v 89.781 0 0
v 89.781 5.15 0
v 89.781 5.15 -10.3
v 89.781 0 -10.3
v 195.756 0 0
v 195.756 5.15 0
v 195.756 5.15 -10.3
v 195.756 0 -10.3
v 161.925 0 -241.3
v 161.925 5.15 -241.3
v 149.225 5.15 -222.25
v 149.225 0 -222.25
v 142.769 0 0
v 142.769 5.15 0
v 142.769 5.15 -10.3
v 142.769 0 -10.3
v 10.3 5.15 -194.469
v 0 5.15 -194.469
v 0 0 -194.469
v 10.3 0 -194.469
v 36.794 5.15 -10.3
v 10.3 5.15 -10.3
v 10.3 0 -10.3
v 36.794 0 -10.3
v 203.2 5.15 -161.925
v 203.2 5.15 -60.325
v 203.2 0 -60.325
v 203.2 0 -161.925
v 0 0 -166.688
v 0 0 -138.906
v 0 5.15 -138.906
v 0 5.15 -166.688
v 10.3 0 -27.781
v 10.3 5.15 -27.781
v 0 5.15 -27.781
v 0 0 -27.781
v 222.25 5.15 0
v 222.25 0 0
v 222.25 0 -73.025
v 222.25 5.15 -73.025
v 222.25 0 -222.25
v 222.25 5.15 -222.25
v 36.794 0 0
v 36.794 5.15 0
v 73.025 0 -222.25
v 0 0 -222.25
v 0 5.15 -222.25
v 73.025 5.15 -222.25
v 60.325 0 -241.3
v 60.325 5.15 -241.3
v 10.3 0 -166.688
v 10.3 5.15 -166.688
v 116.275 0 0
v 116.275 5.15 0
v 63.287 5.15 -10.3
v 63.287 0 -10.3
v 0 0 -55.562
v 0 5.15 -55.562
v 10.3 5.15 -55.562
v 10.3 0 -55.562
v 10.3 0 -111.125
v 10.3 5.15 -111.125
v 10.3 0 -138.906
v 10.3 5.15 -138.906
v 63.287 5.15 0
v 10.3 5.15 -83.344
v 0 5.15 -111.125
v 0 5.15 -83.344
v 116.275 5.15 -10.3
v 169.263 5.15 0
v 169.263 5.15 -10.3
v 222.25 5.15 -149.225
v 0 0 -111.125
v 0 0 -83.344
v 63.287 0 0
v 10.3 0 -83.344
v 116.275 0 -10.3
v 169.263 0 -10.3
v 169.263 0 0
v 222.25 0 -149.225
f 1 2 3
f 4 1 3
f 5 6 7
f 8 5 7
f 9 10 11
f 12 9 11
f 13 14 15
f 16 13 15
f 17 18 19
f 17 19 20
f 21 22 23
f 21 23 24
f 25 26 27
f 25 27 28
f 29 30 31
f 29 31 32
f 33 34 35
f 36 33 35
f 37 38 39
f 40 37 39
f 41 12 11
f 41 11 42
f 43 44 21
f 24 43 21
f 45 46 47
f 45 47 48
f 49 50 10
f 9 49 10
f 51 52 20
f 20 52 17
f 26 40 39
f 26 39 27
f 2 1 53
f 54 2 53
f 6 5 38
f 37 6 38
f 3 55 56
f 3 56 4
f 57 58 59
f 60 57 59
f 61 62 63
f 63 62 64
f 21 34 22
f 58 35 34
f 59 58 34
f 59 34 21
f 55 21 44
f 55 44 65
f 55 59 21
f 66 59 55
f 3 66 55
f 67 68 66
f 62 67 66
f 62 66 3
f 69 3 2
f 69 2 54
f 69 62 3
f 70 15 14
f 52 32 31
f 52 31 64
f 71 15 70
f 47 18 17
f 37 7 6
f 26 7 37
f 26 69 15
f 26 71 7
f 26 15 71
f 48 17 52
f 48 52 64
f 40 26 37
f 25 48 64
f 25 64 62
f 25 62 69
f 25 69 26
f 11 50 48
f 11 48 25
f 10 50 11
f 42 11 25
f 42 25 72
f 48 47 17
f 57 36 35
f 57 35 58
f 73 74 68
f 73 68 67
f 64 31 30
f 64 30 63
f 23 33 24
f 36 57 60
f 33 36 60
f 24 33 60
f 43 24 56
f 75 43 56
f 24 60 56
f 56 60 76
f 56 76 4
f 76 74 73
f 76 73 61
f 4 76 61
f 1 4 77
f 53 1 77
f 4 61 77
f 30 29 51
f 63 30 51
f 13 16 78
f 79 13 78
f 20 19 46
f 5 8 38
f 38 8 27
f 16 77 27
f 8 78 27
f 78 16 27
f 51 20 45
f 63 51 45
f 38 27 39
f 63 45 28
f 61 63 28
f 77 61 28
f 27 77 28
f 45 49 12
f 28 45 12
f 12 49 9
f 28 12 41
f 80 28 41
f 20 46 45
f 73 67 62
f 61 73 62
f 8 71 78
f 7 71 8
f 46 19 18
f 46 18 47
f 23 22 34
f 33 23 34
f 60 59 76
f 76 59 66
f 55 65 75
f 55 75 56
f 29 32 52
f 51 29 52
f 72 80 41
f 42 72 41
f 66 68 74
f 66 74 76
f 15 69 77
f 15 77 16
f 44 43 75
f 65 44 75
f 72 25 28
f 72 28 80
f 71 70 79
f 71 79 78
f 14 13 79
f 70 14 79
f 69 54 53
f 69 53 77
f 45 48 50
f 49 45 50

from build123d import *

# Parameters (mm, degrees)
SKETCH1_W           = 222.25
SKETCH1_H           = 222.25
BOSS_EXTRUDE1_DEPTH = 5.15
SKETCH2_W           = 26.49375
SKETCH2_H           = 10.3
SKETCH2_W_2         = 10.3
SKETCH2_H_2         = 27.78125
CUT_EXTRUDE1_DEPTH  = 315.351153171
BOSS_EXTRUDE2_DEPTH = 5.15
CUT_EXTRUDE2_DEPTH  = 329.096441614


with BuildPart() as part:
    # Sketch1 → Boss-Extrude1 (new body)
    with BuildSketch(Plane(origin=(0, 0, 0), x_dir=(1, 0, 0), z_dir=(0, 1, 0))):
        with Locations((111.125, 111.125)):
            Rectangle(SKETCH1_W, SKETCH1_H)
    extrude(amount=BOSS_EXTRUDE1_DEPTH)

    # Sketch2 → Cut-Extrude1 (cut, through all)
    with BuildSketch(Plane(origin=(0, 5.15, 0), x_dir=(1, 0, 0), z_dir=(0, 1, 0))):
        with Locations((182.509375, 5.15)):
            Rectangle(SKETCH2_W, SKETCH2_H)
        with Locations((129.521875, 5.15)):
            Rectangle(SKETCH2_W, SKETCH2_H)
        with Locations((76.534375, 5.15)):
            Rectangle(SKETCH2_W, SKETCH2_H)
        with Locations((23.546875, 5.15)):
            Rectangle(SKETCH2_W, SKETCH2_H)
        Polygon((0, 0), (10.3, 0), (10.3, 10.3), (10.3, 27.78125), (0, 27.78125), align=None)
        with Locations((5.15, 69.453125)):
            Rectangle(SKETCH2_W_2, SKETCH2_H_2)
        with Locations((5.15, 125.015625)):
            Rectangle(SKETCH2_W_2, SKETCH2_H_2)
        with Locations((5.15, 180.578125)):
            Rectangle(SKETCH2_W_2, SKETCH2_H_2)
    extrude(amount=-CUT_EXTRUDE1_DEPTH, mode=Mode.SUBTRACT)

    # Sketch3 → Boss-Extrude2 (add)
    with BuildSketch(Plane(origin=(0, 5.15, 0), x_dir=(1, 0, 0), z_dir=(0, 1, 0))):
        Polygon((73.025, 222.25), (60.325, 241.3), (161.925, 241.3), (149.225, 222.25), align=None)
    extrude(amount=-BOSS_EXTRUDE2_DEPTH)

    # Sketch4 → Cut-Extrude2 (cut, through all)
    with BuildSketch(Plane(origin=(0, 5.15, 0), x_dir=(1, 0, 0), z_dir=(0, 1, 0))):
        Polygon((222.25, 73.025), (203.2, 60.325), (203.2, 161.925), (222.25, 149.225), align=None)
    extrude(amount=-CUT_EXTRUDE2_DEPTH, mode=Mode.SUBTRACT)


solid = part.part
